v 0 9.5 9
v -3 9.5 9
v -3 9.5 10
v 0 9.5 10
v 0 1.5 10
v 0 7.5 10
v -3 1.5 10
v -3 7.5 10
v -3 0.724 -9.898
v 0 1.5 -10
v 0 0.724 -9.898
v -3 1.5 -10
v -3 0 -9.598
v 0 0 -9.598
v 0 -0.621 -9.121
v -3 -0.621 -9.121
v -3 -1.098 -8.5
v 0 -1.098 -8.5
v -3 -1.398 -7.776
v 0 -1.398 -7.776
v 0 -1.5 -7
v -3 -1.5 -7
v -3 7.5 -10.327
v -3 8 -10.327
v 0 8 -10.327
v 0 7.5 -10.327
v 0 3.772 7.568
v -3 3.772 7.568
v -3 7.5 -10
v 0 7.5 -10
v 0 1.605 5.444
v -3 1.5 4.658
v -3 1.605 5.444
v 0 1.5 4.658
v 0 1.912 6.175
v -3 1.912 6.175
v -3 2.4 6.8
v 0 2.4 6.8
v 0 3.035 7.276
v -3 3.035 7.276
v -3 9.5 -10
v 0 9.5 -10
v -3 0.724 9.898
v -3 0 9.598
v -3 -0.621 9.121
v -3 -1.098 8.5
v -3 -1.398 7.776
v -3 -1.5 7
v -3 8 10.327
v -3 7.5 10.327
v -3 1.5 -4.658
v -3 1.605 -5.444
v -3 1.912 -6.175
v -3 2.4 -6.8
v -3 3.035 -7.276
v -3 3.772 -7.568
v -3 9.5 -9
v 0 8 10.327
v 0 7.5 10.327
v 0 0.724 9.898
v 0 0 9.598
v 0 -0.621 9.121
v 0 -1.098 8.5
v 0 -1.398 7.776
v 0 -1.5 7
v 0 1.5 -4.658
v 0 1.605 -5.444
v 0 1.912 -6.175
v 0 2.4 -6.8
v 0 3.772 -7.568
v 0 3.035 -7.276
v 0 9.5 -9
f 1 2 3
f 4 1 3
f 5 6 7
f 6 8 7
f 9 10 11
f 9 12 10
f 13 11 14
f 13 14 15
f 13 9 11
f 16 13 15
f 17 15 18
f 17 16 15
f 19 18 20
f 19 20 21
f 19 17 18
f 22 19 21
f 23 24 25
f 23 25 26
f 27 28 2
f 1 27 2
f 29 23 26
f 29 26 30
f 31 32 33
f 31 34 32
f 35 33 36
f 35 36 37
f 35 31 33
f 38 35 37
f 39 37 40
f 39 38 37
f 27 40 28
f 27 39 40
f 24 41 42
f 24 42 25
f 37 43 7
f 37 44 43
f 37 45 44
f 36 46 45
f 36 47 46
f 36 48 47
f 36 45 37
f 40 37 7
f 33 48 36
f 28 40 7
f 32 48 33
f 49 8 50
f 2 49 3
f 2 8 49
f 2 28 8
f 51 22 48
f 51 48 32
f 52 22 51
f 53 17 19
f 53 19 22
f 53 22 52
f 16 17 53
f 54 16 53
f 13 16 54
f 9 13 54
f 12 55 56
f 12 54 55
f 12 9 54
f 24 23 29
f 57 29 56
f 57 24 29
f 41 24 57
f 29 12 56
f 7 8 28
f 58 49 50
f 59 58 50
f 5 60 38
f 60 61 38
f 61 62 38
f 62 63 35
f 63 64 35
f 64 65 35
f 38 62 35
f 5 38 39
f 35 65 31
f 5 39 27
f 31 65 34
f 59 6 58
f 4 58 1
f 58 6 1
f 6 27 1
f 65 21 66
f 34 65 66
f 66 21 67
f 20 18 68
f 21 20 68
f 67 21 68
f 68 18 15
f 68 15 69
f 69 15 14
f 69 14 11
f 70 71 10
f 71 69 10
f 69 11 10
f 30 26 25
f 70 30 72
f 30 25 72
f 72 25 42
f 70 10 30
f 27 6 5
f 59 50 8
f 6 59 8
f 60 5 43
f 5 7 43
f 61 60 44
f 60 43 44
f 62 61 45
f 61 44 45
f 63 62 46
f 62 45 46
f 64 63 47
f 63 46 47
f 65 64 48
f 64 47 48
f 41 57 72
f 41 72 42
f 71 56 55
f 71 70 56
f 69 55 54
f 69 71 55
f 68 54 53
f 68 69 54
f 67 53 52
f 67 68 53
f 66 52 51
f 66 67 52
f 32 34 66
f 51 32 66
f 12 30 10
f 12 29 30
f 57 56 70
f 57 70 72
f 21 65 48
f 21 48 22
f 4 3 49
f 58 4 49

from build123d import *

# Parameters (mm, degrees)
SKETCH1_W           = 20
SKETCH1_H           = 3
EXTRUDE_THIN1_DEPTH = 3
SNAP_START          = -3
SNAP_HOOK1_DEPTH    = 3
FILLET2_R           = 3


# Read off the part's stored shape, not the designer's step: Snap Hook1
with BuildPart() as part:
    # Sketch1 → Extrude-Thin1 (new body)
    with BuildSketch(Plane(origin=(0, 0, 0), x_dir=(0, 0, -1), z_dir=(1, 0, 0))):
        Rectangle(SKETCH1_W, SKETCH1_H)
    extrude(amount=-EXTRUDE_THIN1_DEPTH)

    # Snap Hook1 outline → Snap Hook1 (add)
    with BuildSketch(Plane.YZ.offset(SNAP_START)):
        Polygon((7.5, 10), (1.5, 10), (1.5, 7), (9.5, 9), (9.5, 10), (8, 10.327), (7.5, 10.327), align=None)
    snap_hook1 = extrude(amount=SNAP_HOOK1_DEPTH)

    # Mirror2: Snap Hook1 across plane
    add(snap_hook1.mirror(Plane.XY))

    # Fillet2
    fillet2_edges = [part.edges().sort_by_distance(p)[0] for p in [
        (-1.5, 1.5, 7),
        (-1.5, 1.5, -7),
        (-1.5, -1.5, 10),
        (-1.5, -1.5, -10),
    ]]
    fillet(fillet2_edges, radius=FILLET2_R)


solid = part.part
